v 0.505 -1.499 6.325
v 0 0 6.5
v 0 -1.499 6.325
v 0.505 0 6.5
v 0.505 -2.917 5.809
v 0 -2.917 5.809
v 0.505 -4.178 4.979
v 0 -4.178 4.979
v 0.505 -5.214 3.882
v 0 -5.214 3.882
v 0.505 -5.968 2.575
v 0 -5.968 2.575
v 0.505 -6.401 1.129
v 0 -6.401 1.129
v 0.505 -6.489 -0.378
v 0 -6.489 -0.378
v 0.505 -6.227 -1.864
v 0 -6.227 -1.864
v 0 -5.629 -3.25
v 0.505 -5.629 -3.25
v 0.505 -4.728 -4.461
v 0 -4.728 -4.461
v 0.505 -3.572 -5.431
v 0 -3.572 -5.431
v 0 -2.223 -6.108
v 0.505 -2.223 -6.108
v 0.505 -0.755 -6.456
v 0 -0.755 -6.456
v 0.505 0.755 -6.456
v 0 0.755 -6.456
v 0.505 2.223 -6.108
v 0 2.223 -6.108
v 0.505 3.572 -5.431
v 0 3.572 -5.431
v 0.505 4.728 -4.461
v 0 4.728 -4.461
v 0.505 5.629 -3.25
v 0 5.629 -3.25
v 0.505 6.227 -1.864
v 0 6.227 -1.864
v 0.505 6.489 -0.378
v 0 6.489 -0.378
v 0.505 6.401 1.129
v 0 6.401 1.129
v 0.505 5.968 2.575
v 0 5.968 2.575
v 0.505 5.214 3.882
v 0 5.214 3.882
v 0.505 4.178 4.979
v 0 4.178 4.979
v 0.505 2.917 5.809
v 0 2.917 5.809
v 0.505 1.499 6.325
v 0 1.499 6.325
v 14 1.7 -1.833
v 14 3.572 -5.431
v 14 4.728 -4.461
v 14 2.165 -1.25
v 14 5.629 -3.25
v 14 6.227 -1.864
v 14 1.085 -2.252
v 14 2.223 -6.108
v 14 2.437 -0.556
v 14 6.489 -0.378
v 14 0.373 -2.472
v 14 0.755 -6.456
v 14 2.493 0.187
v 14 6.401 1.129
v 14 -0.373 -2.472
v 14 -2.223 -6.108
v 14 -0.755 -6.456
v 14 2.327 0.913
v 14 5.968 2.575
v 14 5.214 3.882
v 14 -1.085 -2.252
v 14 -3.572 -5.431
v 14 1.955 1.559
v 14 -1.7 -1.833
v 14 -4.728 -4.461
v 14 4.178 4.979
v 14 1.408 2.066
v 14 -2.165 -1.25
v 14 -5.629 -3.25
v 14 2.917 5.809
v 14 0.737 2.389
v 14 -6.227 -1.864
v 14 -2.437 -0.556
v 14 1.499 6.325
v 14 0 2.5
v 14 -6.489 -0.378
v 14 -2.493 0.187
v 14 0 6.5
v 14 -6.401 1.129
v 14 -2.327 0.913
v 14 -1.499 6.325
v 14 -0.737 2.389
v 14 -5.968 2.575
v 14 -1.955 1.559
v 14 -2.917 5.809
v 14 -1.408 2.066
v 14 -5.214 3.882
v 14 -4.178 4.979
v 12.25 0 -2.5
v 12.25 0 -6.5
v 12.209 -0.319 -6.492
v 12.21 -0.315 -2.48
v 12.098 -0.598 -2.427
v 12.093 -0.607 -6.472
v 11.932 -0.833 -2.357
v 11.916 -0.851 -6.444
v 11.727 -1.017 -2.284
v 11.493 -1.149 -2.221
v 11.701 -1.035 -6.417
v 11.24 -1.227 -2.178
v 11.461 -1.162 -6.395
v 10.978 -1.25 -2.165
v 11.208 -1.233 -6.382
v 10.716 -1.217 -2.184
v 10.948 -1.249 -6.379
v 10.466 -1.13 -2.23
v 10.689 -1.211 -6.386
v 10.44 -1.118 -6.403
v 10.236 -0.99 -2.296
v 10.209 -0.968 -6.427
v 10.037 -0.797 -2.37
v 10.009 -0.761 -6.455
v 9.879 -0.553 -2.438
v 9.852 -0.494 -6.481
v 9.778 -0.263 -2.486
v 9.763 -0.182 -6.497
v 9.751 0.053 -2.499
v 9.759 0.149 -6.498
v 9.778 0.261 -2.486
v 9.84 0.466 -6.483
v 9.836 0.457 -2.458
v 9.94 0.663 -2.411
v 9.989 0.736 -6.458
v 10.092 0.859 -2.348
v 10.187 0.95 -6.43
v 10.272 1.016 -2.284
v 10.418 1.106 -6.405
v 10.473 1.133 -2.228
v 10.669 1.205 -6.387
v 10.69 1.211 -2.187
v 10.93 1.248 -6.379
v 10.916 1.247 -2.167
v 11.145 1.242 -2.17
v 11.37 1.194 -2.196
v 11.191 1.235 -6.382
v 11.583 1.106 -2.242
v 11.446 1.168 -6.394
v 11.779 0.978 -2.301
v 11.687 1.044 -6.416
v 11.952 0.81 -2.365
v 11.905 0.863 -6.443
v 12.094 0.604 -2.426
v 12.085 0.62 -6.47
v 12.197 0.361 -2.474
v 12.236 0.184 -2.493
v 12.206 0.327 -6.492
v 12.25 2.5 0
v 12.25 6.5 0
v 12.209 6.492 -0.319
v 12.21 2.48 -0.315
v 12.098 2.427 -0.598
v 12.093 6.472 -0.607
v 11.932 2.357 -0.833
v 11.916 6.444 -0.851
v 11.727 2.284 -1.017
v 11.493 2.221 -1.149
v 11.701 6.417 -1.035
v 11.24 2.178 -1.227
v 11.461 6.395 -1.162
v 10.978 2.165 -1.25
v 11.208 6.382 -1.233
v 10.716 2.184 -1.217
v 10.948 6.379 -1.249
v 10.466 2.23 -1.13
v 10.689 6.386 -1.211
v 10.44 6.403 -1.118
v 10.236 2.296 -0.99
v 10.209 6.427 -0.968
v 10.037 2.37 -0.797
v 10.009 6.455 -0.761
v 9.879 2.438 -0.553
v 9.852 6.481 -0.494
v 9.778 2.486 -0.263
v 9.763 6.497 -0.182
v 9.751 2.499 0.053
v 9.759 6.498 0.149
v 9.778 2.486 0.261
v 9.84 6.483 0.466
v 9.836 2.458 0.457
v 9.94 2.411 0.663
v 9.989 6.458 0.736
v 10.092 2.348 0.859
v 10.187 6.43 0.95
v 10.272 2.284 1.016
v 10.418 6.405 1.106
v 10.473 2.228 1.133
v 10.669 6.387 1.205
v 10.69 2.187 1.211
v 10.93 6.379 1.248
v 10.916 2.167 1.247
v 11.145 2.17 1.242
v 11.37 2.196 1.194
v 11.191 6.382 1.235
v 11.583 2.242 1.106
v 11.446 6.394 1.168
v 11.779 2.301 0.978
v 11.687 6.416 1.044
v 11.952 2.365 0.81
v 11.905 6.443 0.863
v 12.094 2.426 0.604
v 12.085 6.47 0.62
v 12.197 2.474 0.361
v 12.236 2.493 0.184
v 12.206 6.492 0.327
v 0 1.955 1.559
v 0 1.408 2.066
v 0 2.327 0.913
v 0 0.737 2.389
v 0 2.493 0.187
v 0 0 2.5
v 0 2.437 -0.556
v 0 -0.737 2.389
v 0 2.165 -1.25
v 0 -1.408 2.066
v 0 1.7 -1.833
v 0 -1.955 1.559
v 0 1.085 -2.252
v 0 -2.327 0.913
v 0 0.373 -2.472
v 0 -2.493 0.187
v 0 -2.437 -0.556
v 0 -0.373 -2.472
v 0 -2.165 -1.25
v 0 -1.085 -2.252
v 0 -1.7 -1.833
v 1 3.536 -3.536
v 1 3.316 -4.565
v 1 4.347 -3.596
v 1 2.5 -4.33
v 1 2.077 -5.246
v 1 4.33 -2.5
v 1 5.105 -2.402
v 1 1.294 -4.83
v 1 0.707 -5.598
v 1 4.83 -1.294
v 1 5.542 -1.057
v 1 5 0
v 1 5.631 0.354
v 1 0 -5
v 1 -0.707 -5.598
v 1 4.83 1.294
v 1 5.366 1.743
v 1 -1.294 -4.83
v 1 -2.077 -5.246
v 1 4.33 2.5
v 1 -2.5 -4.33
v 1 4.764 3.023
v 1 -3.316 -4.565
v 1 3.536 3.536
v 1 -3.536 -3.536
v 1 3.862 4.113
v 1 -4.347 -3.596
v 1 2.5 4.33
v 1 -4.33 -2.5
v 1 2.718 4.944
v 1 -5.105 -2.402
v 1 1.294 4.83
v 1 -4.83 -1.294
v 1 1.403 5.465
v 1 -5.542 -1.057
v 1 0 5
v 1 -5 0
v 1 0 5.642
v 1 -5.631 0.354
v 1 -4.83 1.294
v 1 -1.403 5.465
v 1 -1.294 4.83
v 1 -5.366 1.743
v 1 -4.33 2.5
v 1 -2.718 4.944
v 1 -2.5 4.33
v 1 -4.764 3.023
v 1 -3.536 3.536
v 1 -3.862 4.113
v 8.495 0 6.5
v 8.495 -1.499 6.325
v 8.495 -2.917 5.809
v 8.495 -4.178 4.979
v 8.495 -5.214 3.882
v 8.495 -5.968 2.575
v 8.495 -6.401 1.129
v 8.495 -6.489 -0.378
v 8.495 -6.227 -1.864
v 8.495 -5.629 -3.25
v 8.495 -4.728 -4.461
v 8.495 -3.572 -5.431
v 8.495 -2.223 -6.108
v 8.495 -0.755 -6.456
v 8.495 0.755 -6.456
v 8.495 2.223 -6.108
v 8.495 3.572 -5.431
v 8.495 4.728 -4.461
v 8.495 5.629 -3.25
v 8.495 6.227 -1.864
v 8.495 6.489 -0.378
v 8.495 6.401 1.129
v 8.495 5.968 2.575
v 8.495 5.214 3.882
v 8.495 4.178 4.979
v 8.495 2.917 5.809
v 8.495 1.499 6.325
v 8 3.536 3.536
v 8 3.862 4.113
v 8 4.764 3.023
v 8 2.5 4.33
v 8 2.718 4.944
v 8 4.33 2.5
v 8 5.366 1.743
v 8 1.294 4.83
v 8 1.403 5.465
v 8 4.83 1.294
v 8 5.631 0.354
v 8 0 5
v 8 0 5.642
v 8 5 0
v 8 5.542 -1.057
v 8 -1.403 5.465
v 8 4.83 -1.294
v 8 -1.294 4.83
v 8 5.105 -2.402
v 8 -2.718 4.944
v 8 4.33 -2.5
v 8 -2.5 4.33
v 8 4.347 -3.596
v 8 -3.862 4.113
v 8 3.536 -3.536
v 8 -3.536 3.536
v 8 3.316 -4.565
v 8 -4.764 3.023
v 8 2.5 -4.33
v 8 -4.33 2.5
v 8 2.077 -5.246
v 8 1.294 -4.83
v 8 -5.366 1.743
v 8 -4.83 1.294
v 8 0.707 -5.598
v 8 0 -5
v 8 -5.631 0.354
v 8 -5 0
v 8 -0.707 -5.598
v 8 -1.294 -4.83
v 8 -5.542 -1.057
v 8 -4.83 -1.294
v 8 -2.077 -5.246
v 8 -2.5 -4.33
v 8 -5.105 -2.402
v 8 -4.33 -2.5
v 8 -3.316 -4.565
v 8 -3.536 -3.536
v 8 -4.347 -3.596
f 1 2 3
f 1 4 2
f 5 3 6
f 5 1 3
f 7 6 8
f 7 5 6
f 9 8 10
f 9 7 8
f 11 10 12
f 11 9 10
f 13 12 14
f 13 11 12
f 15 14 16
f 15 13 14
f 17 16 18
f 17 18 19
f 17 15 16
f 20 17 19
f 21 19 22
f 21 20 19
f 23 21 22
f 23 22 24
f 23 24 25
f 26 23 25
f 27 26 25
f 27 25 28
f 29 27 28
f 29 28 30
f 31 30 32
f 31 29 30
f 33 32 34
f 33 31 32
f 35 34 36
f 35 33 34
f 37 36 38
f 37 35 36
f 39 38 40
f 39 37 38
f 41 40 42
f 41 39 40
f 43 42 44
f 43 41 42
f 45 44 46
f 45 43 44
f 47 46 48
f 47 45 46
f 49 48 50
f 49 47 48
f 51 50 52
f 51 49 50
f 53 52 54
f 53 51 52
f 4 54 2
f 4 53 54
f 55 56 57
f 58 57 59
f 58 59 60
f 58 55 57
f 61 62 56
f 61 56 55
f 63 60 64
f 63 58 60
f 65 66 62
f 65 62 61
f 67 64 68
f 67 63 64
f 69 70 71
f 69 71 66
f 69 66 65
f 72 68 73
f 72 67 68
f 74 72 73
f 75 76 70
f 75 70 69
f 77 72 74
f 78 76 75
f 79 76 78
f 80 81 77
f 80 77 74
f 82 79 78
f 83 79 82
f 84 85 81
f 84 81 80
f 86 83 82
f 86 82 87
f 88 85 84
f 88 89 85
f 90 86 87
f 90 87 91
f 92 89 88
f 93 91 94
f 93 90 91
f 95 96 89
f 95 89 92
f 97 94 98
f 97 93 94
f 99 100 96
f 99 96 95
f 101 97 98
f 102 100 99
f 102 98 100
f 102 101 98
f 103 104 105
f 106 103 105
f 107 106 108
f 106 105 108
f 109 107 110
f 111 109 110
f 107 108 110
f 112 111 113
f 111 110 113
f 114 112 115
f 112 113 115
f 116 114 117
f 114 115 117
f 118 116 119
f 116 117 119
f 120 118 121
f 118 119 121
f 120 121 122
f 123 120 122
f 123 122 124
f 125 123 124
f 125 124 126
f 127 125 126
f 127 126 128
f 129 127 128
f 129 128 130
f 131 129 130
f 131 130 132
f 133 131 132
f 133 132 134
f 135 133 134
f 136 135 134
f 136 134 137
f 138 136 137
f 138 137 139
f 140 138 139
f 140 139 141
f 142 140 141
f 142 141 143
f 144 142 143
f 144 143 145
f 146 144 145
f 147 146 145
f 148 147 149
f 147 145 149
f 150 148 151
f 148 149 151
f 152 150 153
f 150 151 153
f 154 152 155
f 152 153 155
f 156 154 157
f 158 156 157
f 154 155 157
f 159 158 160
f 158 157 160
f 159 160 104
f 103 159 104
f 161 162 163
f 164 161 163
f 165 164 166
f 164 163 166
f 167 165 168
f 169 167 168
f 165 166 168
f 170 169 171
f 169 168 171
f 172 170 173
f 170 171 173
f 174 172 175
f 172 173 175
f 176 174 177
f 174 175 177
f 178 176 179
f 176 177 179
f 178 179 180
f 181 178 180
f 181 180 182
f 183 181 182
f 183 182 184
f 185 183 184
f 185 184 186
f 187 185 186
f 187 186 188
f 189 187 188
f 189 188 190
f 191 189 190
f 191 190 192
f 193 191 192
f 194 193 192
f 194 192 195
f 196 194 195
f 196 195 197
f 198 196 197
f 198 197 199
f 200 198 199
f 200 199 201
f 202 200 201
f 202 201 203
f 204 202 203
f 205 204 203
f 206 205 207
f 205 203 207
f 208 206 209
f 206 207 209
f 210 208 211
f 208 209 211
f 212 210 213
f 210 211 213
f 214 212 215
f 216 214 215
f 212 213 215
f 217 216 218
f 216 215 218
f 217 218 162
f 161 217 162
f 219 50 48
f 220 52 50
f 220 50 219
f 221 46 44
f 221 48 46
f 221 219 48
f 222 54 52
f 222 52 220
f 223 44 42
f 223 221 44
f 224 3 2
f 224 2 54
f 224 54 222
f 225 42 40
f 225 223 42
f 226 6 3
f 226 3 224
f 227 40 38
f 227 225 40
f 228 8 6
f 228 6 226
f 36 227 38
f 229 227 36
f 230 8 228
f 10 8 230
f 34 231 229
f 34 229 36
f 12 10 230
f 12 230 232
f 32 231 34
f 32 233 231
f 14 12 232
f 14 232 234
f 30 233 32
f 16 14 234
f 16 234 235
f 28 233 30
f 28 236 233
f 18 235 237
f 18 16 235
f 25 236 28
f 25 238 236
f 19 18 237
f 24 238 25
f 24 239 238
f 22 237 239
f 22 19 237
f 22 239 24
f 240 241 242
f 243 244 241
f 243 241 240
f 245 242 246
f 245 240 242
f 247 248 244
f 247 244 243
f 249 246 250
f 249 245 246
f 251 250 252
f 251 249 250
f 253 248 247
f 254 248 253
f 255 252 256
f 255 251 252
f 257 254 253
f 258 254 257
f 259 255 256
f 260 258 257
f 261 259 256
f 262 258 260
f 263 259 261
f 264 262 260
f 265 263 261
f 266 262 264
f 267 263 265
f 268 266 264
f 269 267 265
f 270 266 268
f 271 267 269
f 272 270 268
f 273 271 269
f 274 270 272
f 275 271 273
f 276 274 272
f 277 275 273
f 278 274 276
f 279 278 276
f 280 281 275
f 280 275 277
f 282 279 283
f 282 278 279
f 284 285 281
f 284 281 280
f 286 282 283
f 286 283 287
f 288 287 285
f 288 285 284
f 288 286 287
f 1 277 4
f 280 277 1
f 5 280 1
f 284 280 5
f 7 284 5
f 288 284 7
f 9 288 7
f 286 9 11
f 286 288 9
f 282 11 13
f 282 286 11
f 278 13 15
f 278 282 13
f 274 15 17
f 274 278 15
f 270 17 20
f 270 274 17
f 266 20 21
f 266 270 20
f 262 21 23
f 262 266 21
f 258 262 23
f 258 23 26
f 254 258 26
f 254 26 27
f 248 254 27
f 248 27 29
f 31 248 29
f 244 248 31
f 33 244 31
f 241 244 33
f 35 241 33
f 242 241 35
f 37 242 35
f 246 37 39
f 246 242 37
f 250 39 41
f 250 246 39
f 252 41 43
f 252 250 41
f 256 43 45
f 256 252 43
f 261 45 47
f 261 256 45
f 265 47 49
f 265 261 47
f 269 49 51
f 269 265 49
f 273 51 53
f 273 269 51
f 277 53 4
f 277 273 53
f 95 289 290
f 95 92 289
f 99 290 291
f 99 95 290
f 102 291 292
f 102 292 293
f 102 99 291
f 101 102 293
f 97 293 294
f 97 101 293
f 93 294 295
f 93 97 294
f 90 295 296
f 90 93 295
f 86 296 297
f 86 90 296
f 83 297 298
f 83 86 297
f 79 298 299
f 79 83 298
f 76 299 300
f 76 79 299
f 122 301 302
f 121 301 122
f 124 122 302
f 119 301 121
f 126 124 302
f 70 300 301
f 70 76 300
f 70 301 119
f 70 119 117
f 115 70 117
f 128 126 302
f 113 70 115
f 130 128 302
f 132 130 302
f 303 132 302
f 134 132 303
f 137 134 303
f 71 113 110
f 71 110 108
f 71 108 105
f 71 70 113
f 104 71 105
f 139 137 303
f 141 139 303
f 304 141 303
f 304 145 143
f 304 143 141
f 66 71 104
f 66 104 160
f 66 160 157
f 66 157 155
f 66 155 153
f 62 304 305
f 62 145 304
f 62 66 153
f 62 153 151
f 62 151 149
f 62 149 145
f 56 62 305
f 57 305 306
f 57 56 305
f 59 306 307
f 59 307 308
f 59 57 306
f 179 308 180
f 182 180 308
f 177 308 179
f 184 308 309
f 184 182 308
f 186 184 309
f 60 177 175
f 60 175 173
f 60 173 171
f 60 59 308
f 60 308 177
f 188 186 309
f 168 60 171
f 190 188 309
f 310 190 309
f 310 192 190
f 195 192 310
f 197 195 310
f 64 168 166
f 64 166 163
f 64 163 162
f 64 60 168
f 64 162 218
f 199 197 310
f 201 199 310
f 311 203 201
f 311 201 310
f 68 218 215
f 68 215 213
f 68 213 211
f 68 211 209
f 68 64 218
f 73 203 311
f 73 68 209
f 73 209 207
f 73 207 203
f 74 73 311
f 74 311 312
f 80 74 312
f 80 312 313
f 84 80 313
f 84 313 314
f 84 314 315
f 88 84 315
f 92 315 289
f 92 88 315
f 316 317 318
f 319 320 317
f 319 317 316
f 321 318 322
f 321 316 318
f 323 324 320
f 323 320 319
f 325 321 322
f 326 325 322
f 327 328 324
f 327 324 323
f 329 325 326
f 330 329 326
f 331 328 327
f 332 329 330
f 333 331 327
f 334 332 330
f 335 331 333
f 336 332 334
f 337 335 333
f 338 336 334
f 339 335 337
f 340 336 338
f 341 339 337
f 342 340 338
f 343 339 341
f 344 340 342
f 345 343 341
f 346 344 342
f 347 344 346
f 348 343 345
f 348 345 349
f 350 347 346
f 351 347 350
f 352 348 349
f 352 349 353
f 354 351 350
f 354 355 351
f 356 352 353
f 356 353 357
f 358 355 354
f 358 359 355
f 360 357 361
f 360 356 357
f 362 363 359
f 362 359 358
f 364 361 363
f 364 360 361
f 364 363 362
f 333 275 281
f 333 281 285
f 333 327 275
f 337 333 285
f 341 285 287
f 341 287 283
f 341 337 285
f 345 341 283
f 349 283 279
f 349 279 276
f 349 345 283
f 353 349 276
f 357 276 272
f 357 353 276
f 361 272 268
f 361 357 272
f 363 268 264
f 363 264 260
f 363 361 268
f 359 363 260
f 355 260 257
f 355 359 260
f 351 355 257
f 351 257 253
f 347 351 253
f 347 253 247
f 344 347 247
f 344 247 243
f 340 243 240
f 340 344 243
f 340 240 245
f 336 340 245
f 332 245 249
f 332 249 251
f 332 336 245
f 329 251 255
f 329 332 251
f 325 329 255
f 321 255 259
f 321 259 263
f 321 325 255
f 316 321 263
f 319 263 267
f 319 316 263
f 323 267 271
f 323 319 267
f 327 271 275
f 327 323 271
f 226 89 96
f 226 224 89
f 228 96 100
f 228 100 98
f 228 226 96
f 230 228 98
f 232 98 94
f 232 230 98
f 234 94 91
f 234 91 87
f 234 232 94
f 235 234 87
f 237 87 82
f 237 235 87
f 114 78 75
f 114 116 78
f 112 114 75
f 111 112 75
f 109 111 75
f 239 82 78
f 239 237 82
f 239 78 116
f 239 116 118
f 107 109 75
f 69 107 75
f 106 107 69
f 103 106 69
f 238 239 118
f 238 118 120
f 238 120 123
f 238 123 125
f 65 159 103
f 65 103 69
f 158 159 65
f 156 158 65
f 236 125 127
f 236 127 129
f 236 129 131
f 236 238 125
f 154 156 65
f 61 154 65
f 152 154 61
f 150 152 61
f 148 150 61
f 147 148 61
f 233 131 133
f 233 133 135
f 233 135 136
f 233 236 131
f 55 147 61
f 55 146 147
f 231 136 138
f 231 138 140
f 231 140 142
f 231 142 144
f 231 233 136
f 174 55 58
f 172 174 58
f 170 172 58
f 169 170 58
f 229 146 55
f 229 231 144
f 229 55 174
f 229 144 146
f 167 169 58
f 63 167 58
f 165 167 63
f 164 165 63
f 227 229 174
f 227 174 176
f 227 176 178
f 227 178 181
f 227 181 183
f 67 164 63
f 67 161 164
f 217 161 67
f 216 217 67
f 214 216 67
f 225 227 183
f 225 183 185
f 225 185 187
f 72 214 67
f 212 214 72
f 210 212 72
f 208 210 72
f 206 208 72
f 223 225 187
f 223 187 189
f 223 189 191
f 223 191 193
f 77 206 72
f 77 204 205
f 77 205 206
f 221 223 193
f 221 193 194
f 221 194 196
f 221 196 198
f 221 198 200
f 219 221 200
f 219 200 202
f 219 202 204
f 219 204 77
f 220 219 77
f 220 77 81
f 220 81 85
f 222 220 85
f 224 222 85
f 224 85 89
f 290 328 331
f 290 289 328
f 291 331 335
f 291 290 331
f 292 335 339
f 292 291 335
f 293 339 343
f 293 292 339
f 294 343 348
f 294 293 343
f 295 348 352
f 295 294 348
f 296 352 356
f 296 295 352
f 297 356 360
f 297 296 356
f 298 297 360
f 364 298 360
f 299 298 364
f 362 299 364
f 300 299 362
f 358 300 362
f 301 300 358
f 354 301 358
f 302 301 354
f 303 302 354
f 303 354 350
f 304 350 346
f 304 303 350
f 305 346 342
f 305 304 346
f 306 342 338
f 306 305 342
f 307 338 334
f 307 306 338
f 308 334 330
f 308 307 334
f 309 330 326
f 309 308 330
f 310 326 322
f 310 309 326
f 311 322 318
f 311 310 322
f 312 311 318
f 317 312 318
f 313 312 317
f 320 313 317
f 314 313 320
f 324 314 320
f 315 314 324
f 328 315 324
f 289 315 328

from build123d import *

# Parameters (mm, degrees)
HOLE_WIZARD_M3_1_REACH   = 22.18
HOLE_WIZARD_M3_1_BORE_R  = 1.25
PATTERN_CIRCULAR_1_COUNT = 2
PATTERN_CIRCULAR_1_ANGLE = 90


with BuildPart() as part:
    # 草图1 → 旋转1 (revolve)
    with BuildSketch(Plane(origin=(0, 0, 0), x_dir=(1, 0, 0), z_dir=(0, 1, 0)), mode=Mode.PRIVATE) as revolve_1_sk:
        Polygon((14, 6.5), (14, 2.5), (0, 2.5), (0, 6.5), (0.504674566, 6.5), (1, 5.642071182), (1, 5), (8, 5), (8, 5.642071182), (8.495325434, 6.5), align=None)
    revolve(revolve_1_sk.sketch.rotate(Axis((-10.793334546, 0, 0), (1, 0, 0)), 180), axis=Axis((-10.793334546, 0, 0), (1, 0, 0)))

    # M3 螺纹孔1 bore → M3 螺纹孔1 (cut, up to next)
    with BuildSketch(Plane(origin=(0, 6.5, 0), x_dir=(1, 0, 0), z_dir=(0, 1, 0)), mode=Mode.PRIVATE) as hole_wizard_m3_1_sk1:
        with Locations((11, 0)):
            Circle(HOLE_WIZARD_M3_1_BORE_R)
    hole_wizard_m3_1_tool1 = extrude(hole_wizard_m3_1_sk1.sketch, amount=-HOLE_WIZARD_M3_1_REACH, mode=Mode.PRIVATE) & part.part
    hole_wizard_m3_1 = hole_wizard_m3_1_tool1.solids().sort_by_distance((11, 6.5, 0))[0]
    add(hole_wizard_m3_1, mode=Mode.SUBTRACT)

    # 阵列(圆周)1: M3 螺纹孔1 ×2 about axis
    pattern_circular_1_axis = Axis((-10.793334546, 0, 0), (-1, 0, 0))
    for i in range(1, PATTERN_CIRCULAR_1_COUNT):
        add(hole_wizard_m3_1.rotate(pattern_circular_1_axis, i * PATTERN_CIRCULAR_1_ANGLE / (PATTERN_CIRCULAR_1_COUNT - 1)), mode=Mode.SUBTRACT)


solid = part.part
